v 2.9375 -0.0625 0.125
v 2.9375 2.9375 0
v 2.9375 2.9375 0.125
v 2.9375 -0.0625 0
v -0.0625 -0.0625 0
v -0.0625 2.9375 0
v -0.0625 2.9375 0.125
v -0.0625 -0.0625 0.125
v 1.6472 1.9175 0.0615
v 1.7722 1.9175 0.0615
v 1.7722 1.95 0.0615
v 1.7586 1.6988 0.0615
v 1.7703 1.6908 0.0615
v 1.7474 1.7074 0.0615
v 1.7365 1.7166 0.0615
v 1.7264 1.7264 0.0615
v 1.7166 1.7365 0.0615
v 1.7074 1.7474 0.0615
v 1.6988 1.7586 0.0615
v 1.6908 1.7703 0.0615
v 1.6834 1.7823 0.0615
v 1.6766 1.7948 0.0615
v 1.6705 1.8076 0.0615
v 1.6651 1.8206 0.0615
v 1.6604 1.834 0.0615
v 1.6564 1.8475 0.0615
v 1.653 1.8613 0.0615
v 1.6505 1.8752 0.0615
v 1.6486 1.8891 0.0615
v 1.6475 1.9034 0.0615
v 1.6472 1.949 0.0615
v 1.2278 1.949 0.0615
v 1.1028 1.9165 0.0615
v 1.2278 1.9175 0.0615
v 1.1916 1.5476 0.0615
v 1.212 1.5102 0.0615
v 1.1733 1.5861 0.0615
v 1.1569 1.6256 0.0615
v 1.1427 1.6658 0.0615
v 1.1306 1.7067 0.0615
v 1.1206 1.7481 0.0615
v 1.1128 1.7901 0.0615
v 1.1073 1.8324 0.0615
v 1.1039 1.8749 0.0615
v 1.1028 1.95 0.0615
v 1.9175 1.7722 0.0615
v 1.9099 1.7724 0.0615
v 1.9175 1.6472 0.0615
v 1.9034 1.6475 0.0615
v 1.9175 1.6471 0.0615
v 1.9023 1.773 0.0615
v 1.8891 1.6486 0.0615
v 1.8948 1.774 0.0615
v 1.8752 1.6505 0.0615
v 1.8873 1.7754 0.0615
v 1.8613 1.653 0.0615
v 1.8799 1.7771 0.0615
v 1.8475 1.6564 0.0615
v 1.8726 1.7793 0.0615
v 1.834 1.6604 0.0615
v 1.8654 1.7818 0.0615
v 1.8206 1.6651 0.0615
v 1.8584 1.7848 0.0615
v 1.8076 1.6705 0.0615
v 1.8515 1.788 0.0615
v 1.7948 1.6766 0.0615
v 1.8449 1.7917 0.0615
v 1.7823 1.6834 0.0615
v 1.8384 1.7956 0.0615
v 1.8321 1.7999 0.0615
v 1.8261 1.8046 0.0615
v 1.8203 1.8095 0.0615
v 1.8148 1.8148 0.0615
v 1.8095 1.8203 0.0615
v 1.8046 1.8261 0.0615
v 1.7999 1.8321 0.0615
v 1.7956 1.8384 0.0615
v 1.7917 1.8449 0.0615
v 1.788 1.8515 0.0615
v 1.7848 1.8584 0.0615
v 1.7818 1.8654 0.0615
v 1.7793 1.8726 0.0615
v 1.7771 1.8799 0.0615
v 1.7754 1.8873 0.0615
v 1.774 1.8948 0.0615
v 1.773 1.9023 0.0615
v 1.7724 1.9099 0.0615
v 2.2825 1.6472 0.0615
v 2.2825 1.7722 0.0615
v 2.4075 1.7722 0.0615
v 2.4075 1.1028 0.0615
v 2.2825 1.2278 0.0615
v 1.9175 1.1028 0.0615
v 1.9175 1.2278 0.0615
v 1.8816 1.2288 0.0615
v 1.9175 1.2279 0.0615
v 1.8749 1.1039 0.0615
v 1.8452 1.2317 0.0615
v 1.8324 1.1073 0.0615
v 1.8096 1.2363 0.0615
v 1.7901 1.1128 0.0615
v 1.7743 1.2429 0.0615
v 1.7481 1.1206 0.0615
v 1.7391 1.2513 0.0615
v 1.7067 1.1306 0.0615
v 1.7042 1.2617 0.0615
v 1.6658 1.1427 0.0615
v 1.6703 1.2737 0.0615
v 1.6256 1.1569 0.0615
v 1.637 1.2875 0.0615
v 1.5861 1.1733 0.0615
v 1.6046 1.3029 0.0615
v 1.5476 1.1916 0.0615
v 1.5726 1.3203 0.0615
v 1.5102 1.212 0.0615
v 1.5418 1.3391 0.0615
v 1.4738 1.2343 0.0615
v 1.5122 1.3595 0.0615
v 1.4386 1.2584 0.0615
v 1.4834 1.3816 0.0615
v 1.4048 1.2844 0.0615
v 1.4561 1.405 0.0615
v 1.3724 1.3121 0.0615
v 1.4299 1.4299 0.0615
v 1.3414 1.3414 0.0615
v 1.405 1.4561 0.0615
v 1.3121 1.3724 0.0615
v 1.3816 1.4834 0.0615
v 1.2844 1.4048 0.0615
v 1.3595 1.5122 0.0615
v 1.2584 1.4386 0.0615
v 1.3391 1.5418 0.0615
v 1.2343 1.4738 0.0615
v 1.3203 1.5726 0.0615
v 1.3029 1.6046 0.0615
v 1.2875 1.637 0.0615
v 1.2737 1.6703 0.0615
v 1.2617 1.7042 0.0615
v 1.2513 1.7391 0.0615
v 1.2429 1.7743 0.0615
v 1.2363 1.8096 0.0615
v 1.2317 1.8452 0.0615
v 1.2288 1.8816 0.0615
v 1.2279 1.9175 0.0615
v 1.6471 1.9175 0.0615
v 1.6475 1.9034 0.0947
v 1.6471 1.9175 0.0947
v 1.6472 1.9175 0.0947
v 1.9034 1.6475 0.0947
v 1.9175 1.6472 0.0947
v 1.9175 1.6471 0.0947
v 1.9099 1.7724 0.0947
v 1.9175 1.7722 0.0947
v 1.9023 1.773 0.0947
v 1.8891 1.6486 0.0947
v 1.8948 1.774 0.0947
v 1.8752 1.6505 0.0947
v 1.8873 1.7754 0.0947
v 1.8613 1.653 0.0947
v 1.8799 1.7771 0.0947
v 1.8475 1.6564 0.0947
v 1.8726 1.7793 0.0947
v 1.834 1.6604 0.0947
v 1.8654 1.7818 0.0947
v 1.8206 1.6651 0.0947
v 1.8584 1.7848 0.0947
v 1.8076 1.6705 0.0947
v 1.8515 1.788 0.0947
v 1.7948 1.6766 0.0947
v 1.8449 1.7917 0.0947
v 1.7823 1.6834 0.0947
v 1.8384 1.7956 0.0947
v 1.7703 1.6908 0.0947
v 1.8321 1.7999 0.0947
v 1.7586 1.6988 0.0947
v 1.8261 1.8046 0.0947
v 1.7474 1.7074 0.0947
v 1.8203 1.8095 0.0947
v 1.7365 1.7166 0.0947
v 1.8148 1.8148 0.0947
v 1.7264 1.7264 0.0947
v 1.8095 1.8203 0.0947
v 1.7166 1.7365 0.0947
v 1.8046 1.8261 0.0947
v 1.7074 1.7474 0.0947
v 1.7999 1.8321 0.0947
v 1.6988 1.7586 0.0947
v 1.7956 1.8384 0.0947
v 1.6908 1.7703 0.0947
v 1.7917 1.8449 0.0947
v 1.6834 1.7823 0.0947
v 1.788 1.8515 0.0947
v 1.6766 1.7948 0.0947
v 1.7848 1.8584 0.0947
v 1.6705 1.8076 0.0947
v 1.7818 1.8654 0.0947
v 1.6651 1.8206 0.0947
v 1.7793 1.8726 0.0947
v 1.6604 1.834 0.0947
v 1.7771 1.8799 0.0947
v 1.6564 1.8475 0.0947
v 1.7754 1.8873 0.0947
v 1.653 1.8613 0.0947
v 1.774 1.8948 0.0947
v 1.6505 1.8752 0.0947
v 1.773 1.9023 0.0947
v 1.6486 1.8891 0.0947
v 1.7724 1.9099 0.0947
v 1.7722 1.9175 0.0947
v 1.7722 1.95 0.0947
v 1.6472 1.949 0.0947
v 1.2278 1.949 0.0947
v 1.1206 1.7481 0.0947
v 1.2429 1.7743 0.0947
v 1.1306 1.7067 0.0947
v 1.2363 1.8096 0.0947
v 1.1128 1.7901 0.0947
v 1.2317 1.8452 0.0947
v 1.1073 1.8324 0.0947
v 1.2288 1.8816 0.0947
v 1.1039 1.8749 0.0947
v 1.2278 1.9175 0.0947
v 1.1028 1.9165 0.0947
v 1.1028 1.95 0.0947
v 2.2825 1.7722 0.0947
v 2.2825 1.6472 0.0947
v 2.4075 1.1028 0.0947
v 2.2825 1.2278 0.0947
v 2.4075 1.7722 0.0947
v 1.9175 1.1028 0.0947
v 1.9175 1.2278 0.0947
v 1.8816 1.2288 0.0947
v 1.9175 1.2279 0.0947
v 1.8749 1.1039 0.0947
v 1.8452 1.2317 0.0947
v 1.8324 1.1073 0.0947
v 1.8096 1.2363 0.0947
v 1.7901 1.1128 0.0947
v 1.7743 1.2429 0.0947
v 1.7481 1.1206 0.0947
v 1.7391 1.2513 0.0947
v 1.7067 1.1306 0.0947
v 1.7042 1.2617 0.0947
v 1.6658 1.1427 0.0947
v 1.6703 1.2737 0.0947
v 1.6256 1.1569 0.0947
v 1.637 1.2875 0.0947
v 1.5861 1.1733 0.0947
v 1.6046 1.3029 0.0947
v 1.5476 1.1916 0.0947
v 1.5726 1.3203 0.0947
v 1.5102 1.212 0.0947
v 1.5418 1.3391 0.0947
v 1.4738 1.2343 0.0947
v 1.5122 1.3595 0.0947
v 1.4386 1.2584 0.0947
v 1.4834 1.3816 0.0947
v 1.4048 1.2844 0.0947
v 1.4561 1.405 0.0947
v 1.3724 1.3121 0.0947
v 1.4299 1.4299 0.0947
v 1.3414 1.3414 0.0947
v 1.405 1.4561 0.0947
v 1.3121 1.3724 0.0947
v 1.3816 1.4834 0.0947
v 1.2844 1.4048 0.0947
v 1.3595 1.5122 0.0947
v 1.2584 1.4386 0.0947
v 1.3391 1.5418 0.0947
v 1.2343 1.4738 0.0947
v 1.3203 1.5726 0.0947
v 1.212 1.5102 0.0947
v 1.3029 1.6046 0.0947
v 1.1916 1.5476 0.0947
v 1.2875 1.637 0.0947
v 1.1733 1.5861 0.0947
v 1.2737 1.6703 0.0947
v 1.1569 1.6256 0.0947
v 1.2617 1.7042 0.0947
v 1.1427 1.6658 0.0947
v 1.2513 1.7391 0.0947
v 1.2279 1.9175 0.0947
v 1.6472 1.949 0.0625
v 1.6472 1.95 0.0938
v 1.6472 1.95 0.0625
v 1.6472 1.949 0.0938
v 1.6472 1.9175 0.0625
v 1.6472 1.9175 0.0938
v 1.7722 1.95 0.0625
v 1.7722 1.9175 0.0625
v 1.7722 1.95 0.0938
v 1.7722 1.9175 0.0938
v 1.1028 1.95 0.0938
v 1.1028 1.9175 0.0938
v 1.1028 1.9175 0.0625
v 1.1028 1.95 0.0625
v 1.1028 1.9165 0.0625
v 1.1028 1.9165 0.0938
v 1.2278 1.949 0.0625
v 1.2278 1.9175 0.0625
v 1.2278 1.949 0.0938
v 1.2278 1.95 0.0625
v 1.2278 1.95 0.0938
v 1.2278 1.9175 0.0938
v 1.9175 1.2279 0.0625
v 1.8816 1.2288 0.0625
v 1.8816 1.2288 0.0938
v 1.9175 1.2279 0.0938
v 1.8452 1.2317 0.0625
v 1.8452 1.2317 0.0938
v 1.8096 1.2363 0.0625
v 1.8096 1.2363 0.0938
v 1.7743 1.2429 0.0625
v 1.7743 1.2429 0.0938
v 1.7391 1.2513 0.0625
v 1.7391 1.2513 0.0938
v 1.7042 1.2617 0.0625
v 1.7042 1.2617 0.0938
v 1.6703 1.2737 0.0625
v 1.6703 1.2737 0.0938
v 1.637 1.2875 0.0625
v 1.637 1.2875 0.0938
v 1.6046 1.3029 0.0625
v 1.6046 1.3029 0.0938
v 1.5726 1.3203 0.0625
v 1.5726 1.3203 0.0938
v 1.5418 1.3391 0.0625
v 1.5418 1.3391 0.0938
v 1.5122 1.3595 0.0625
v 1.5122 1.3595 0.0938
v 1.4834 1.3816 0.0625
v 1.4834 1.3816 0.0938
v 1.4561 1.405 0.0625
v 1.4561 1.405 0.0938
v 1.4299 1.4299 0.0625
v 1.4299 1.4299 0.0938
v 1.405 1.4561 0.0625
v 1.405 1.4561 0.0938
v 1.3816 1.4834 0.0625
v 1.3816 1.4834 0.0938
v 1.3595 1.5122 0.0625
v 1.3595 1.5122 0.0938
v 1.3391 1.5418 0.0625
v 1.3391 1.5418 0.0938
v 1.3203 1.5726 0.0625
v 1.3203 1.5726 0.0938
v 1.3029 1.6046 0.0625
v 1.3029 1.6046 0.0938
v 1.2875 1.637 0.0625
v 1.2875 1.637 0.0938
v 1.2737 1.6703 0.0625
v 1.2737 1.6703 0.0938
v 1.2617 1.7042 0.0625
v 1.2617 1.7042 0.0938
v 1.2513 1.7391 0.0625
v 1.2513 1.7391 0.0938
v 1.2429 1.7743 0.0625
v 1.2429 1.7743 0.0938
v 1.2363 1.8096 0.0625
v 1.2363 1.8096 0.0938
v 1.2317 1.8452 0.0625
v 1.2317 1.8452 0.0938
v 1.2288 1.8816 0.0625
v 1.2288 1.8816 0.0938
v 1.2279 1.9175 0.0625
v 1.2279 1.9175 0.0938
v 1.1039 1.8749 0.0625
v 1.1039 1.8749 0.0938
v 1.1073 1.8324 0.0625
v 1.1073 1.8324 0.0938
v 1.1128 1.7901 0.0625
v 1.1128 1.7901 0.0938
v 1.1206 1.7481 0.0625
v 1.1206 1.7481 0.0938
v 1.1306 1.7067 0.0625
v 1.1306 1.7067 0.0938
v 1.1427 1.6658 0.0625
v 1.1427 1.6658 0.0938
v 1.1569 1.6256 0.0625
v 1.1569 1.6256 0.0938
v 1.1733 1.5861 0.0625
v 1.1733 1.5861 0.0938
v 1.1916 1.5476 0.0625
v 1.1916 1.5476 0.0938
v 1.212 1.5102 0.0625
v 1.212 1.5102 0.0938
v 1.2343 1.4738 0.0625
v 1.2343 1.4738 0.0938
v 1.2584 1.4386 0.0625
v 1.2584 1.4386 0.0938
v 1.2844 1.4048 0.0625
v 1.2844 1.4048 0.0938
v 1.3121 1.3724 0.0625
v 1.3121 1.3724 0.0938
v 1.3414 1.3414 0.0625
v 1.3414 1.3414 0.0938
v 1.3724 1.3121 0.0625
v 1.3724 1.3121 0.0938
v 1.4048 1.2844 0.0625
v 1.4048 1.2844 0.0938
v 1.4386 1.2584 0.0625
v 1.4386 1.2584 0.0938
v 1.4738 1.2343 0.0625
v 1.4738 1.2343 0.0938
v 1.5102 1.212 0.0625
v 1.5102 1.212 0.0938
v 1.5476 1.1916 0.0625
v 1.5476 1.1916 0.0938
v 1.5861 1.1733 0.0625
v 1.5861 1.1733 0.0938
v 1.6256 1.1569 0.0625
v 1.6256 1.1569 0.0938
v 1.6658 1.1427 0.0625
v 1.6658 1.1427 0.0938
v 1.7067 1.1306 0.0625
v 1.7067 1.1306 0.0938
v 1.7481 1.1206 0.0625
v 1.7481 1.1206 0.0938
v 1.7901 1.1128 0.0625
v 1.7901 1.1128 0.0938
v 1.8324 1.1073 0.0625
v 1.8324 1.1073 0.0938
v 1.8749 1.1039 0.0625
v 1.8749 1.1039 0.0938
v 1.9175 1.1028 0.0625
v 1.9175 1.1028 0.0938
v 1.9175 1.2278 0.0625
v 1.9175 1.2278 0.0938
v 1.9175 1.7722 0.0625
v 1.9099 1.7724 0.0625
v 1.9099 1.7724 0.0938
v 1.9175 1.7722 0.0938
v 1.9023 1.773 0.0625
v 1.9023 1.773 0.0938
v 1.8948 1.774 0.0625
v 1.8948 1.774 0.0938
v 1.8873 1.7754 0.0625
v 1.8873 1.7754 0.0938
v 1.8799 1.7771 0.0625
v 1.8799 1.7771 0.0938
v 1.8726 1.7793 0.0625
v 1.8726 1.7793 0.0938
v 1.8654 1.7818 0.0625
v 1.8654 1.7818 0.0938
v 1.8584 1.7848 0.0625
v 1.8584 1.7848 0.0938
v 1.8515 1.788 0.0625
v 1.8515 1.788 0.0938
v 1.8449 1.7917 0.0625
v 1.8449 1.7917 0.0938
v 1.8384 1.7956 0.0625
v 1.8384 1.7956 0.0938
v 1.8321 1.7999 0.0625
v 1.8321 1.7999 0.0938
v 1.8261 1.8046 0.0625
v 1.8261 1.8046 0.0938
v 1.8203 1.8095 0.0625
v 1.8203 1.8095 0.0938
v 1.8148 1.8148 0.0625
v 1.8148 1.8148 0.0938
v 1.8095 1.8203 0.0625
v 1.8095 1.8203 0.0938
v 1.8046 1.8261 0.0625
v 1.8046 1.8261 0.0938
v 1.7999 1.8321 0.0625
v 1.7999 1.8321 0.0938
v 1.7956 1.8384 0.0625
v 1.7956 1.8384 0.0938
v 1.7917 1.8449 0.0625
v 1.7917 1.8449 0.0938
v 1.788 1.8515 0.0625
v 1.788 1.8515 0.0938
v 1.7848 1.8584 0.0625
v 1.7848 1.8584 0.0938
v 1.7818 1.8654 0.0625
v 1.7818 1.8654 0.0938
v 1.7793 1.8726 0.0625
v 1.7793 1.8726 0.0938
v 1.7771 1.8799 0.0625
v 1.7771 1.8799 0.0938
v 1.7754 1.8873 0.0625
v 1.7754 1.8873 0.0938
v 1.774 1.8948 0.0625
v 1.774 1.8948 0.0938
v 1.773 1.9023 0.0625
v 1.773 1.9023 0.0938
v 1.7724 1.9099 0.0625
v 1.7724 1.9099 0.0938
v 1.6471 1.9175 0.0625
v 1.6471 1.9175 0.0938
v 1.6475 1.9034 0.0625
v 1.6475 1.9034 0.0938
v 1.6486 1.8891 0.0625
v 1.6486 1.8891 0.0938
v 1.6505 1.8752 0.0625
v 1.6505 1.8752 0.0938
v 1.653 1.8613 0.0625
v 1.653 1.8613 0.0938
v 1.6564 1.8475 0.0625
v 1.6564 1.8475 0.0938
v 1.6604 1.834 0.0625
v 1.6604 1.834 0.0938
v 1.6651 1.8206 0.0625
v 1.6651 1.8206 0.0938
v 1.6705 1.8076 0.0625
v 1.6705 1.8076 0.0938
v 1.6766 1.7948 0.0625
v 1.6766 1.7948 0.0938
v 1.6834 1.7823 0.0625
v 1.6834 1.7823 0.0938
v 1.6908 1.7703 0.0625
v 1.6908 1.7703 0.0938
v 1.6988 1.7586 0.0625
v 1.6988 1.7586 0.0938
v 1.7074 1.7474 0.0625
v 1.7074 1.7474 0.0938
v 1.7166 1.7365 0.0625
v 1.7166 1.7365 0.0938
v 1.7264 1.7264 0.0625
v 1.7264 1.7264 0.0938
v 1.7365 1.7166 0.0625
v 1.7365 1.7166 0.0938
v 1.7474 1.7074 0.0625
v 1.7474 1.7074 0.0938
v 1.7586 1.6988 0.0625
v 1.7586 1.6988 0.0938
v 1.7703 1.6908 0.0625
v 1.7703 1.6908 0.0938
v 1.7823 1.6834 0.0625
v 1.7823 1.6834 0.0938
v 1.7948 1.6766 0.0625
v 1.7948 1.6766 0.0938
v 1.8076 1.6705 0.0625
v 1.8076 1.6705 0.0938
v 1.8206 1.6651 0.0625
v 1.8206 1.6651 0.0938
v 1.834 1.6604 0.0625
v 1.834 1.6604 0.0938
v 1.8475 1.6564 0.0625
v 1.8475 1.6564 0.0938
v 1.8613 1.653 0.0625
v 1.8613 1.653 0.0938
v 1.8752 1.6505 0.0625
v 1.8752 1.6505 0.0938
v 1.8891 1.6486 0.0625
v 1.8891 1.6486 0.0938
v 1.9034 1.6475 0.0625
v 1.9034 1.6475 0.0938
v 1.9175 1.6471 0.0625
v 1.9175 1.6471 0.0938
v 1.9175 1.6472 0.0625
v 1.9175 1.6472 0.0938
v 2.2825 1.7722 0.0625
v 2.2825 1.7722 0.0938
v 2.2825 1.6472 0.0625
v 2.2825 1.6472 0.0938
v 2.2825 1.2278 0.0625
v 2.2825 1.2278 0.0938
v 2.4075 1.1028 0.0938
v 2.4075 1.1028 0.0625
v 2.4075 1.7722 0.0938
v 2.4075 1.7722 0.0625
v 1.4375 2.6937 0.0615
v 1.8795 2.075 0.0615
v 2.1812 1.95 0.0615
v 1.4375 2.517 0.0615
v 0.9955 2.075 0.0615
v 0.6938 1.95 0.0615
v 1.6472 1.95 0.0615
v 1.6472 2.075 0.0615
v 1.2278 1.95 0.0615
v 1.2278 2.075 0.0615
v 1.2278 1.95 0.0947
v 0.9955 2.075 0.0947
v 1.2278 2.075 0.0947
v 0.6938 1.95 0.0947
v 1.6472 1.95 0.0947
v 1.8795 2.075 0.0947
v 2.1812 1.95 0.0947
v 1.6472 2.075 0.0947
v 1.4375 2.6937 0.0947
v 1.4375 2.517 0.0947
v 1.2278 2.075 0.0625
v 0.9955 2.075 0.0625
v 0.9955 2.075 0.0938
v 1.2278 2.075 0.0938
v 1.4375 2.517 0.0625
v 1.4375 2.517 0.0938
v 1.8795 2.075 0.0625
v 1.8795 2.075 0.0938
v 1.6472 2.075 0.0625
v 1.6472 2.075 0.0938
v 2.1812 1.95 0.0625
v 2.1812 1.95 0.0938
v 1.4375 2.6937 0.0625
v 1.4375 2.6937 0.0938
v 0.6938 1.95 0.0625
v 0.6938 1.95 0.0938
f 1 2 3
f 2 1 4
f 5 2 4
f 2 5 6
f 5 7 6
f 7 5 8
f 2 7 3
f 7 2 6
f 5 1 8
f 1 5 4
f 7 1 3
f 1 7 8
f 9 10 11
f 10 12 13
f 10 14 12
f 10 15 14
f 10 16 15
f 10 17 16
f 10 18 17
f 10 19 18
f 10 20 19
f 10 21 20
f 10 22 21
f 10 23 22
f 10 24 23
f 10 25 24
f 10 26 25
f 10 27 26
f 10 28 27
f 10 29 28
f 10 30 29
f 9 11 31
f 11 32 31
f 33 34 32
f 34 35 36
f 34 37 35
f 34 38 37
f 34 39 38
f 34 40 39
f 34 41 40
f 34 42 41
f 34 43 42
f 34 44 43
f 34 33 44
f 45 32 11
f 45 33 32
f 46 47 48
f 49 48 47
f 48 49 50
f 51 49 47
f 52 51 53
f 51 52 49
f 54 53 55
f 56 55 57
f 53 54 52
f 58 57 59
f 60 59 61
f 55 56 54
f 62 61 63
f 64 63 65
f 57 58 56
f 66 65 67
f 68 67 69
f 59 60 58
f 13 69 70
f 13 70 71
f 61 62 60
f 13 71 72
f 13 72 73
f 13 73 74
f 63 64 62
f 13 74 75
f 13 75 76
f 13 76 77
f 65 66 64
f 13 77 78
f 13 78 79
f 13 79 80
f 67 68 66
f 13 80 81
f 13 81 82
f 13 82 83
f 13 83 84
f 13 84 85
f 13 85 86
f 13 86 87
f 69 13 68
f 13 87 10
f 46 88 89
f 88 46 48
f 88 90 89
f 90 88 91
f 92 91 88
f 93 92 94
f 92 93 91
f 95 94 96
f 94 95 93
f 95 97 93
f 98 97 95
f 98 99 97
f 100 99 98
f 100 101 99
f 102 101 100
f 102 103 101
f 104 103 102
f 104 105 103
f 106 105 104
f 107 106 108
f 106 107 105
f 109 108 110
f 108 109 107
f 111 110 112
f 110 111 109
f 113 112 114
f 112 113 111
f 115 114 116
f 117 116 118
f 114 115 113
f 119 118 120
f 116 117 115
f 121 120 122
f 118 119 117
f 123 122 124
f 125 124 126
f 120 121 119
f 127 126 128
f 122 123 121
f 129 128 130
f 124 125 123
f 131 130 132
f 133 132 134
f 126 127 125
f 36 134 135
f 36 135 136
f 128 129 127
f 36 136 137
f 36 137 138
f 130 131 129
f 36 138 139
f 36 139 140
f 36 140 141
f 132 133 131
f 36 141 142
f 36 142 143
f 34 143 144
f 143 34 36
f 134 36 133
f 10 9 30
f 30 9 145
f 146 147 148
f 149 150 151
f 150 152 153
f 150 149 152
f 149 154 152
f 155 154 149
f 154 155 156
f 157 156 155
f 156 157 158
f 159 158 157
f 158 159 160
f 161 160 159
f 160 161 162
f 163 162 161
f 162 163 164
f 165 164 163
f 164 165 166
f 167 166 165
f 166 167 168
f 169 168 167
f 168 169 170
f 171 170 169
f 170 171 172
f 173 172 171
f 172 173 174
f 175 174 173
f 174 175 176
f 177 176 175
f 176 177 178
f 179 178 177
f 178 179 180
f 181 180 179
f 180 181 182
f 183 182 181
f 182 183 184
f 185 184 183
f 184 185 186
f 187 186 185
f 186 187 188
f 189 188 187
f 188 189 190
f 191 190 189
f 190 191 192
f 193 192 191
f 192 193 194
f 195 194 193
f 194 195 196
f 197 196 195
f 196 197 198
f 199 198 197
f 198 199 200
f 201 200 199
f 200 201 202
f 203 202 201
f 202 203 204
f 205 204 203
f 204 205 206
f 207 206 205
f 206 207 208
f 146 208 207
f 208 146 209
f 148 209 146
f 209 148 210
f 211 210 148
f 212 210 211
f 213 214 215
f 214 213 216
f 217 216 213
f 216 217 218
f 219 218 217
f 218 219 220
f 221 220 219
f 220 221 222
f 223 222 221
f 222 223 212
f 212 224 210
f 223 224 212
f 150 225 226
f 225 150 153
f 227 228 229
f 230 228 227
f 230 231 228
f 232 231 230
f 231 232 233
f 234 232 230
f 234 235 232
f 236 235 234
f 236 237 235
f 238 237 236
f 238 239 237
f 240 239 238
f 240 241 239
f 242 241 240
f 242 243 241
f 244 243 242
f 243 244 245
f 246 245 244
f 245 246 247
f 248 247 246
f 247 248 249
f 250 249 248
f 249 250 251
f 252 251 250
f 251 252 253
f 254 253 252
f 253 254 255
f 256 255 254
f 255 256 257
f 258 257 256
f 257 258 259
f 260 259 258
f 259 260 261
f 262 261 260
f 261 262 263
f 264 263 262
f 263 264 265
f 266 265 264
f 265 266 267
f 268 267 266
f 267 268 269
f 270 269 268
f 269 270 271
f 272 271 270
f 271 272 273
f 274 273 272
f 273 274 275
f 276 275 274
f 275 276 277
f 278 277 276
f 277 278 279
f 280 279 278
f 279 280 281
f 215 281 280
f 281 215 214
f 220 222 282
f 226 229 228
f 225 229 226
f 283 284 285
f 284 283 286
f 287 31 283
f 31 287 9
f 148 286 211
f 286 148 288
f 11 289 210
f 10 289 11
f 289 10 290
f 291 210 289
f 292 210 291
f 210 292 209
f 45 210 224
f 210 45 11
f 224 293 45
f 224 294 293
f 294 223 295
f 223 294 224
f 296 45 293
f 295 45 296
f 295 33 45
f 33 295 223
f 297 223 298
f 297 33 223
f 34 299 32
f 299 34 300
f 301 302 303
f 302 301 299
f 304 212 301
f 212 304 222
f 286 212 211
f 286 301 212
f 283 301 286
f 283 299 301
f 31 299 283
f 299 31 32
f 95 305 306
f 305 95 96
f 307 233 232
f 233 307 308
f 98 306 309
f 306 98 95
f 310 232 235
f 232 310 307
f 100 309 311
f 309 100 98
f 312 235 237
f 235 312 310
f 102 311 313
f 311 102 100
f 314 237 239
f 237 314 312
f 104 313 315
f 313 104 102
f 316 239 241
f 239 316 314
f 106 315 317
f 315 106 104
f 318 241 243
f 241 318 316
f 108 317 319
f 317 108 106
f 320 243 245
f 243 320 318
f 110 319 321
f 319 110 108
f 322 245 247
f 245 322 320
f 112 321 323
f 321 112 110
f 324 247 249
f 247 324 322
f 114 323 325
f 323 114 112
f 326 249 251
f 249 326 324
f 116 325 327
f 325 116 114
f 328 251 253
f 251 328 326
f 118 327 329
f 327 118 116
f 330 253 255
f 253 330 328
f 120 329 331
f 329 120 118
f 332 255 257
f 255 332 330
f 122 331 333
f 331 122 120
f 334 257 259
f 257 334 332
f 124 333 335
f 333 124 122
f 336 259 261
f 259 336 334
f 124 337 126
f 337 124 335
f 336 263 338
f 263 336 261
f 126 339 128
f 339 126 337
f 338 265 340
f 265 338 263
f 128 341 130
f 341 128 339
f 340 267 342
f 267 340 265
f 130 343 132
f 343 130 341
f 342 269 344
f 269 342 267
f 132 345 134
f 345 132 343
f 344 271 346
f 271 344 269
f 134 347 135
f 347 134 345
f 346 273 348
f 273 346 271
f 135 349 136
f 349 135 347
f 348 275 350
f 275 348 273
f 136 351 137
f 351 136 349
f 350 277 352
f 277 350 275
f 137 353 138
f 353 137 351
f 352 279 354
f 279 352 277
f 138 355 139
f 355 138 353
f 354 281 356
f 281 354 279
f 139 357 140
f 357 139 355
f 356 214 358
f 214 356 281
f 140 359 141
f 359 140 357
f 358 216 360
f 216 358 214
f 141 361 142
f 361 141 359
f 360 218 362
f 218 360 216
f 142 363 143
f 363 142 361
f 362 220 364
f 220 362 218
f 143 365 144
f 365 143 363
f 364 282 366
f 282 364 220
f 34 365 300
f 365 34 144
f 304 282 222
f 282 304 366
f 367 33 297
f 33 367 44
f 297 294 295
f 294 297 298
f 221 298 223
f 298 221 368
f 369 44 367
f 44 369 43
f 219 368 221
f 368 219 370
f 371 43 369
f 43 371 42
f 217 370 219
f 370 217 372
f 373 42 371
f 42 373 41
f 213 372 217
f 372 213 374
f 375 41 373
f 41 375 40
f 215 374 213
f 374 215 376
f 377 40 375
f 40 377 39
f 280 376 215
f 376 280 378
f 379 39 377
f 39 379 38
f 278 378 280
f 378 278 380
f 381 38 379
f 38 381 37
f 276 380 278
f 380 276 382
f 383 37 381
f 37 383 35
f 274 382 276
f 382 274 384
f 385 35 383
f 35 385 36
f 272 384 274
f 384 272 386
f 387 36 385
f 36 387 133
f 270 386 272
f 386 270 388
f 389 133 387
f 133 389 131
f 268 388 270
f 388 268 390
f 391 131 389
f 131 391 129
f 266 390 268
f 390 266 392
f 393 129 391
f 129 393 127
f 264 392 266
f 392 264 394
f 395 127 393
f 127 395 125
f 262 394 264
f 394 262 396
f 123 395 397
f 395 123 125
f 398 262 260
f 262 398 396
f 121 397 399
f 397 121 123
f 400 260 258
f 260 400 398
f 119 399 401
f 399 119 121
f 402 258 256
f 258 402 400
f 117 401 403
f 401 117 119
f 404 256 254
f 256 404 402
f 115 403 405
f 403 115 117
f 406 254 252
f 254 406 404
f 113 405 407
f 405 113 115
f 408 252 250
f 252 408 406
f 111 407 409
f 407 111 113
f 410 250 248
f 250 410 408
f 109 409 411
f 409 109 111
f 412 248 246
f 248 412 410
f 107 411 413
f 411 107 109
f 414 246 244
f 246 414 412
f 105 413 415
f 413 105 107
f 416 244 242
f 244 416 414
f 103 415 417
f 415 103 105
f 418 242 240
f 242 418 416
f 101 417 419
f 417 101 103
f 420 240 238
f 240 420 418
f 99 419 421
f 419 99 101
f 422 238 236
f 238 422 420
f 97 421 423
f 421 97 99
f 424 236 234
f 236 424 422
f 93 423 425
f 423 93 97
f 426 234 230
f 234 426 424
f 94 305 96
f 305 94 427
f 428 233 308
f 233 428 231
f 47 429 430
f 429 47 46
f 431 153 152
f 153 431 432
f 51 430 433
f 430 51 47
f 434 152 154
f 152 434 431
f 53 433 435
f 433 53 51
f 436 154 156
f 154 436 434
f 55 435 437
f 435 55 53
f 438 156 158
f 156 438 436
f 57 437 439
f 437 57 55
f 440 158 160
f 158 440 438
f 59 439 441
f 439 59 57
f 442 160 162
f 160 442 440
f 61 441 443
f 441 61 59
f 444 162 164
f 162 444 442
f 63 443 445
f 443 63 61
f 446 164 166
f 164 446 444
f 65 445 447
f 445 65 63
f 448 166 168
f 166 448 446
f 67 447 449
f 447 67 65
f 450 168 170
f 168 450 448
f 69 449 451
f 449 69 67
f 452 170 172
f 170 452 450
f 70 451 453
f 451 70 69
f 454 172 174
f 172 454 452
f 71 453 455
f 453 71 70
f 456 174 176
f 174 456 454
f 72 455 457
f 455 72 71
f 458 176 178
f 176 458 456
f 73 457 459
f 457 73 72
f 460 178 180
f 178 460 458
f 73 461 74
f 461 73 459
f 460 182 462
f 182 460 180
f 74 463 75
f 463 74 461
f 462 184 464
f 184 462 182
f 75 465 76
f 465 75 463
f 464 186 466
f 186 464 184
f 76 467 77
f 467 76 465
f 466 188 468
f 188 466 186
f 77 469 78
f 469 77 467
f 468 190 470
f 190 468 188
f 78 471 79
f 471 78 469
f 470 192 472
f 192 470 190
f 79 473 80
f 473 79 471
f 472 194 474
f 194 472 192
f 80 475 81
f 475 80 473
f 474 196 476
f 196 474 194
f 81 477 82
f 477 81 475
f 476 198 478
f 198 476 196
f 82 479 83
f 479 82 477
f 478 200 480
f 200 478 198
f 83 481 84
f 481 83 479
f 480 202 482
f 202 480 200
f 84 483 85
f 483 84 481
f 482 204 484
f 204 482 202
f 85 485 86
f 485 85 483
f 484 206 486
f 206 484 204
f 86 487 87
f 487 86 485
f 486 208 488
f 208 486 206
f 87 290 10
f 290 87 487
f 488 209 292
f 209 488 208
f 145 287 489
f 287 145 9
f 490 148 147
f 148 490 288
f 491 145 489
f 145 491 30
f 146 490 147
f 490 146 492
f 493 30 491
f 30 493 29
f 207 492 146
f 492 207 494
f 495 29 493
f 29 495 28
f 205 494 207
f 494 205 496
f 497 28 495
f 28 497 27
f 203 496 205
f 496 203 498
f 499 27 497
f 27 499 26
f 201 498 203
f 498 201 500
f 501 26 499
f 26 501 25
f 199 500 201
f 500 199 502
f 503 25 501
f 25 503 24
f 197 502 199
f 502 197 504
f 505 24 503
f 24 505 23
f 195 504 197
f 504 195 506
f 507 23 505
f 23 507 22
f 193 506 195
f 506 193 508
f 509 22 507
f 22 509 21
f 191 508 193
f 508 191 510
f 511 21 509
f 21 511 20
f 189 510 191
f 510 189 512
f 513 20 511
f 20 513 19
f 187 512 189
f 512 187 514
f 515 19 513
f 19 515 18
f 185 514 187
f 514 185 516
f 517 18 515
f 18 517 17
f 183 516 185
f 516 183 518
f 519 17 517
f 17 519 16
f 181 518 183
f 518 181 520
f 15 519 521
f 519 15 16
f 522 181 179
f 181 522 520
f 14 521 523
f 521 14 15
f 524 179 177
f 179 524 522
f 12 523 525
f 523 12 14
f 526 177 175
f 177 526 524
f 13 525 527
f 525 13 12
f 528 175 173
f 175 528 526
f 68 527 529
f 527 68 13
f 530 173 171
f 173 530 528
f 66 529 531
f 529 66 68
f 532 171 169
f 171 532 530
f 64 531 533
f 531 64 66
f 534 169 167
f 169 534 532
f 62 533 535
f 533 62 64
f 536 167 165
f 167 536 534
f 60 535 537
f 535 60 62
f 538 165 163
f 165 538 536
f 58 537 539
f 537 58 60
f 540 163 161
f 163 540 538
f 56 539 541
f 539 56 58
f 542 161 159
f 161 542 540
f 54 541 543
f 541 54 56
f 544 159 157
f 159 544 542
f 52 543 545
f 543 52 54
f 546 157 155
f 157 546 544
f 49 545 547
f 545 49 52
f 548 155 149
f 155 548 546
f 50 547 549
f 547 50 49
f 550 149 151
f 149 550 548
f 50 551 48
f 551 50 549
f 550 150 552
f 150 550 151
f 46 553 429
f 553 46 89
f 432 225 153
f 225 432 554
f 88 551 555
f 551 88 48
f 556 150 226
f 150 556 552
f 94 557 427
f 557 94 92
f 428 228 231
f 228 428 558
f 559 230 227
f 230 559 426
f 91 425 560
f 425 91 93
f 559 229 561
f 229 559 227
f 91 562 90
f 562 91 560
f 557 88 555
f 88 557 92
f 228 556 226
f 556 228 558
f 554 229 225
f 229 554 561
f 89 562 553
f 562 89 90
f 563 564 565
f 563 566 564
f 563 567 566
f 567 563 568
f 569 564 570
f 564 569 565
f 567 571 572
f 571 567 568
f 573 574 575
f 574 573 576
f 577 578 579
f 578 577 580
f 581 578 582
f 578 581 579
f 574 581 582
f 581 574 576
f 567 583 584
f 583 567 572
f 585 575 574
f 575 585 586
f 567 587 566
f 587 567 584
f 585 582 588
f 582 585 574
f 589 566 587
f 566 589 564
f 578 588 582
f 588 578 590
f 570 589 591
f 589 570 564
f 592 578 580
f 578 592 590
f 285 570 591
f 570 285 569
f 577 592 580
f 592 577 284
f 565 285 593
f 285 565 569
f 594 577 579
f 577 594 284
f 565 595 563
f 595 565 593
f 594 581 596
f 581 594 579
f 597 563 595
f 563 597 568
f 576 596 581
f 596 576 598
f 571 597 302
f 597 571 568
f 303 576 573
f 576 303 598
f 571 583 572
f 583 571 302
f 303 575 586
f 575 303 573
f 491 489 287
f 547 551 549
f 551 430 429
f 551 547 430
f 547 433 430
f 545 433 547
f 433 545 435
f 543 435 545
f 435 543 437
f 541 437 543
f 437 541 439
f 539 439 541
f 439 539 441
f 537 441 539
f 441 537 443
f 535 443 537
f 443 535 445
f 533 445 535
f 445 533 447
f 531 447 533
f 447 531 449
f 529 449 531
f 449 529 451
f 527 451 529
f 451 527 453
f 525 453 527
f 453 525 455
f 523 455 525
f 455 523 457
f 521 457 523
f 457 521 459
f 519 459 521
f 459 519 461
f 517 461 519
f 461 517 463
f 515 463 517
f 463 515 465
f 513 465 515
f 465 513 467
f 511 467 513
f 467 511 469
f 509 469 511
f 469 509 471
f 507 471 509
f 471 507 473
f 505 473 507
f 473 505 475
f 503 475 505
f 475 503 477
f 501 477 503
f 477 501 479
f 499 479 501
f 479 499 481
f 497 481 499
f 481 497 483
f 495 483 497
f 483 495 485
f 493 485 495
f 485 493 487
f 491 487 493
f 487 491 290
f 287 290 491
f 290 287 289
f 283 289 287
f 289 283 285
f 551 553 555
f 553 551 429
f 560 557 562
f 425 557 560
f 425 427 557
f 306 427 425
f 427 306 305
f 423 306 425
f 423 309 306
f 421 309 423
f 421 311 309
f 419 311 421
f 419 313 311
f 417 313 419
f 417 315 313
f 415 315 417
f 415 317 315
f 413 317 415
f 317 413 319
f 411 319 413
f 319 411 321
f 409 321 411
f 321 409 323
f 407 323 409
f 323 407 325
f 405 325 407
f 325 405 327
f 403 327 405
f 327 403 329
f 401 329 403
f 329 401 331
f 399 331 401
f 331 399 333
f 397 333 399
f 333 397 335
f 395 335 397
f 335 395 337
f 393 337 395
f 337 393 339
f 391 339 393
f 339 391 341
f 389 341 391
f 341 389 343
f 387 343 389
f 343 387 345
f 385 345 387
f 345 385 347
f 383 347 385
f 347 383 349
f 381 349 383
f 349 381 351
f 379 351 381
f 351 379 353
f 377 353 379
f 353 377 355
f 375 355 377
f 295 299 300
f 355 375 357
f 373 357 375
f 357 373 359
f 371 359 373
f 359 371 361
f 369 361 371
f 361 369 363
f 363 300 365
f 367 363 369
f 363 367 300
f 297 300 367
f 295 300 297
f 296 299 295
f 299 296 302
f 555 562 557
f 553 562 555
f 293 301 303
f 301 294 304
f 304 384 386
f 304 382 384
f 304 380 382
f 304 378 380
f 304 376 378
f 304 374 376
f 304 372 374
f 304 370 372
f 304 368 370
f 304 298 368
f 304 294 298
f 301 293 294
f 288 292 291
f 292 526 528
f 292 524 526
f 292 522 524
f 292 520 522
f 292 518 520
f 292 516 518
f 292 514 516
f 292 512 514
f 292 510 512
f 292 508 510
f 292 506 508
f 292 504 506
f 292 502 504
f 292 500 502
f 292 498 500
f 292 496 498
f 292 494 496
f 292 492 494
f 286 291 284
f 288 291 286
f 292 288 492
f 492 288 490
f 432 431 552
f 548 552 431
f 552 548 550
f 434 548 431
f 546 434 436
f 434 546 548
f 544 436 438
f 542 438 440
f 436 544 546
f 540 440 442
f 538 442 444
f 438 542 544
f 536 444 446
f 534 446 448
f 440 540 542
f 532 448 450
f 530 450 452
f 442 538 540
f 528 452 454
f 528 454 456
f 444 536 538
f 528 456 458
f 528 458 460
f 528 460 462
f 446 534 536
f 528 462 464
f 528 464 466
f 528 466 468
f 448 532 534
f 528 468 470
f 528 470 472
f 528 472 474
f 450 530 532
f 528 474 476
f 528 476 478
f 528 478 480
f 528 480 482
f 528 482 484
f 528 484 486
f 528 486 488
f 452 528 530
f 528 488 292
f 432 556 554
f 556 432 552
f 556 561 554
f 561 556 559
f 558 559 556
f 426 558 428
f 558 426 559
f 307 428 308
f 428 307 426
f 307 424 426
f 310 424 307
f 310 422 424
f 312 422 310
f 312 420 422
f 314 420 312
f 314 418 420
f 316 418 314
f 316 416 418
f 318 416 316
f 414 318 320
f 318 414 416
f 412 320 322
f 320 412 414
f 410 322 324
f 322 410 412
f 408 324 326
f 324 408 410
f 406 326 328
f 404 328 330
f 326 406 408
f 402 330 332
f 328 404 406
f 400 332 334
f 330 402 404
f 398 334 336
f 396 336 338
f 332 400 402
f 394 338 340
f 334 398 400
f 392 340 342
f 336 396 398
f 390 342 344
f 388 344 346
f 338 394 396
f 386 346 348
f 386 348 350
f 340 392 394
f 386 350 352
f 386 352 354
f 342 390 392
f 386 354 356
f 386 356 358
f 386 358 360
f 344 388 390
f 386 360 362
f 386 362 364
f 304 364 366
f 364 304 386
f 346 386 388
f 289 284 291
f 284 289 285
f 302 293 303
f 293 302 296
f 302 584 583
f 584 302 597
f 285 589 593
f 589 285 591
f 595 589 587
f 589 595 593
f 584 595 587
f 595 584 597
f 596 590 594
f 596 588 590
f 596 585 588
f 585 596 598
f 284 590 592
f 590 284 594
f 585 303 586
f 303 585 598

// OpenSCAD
// file: sub_water_base_plate.scad
// sub_water_base_plate.scad — base plate for the "water" tile family
// (element55 straight, future right-turn/left-turn variants)
// Units: inches
//
// Unlike sub_base_plate.scad's single darkgray plate, this family stacks the
// top pattern_h-plus a bit into three visible layers, bottom to top:
//   darkgray          — 1/2 plate_h  (structural base)
//   background_color  — 1/4 plate_h  (caller-defined)
//   transparent_color — 1/4 plate_h  (caller-defined, spans the outer
//                                      footprint — frame included — so it
//                                      caps the border too)
// Rivets run through darkgray + background_color only (3/4 plate_h) — the
// transparent_color cap sits over them uncut. frame_with_id() is built to
// that same 3/4 plate_h, so its top 1/4 is covered by the transparent cap
// exactly like the inner plate. The arrow (sub_water_arrows.scad) is
// unaffected — it still lives in its own top pattern_h slice, which happens
// to be the same pattern_h as the transparent_color layer at current
// dimensions, but is not derived from it.

plate_w = 2 + 7/8;
plate_d = 2 + 7/8;
plate_h = 1/8; // full plate thickness
frame_w = 1/16;
hole_d  = 3/32;
hole_r  = hole_d / 2;

pattern_h = 1/32;  // thickness of the arrow's top slice (sub_water_arrows.scad) —
                   // independent of the layer fractions below even though it
                   // currently equals plate_h/4.
id_cover = plate_h * 3 / 16;

// ── Layer heights ───────────────────────────────────────────────────────
darkgray_h    = plate_h / 2;
background_h  = plate_h / 4;
transparent_h = plate_h / 4;
frame_h       = plate_h * 3 / 4;               // = darkgray_h + background_h
rivet_depth   = darkgray_h + background_h;     // rivets stop where the transparent cap starts

module rivet_holes() {
    spacing_x = plate_w / 10;
    spacing_y = plate_d / 10;
    inset_x   = spacing_x / 2;
    inset_y   = spacing_y / 2;
    for (i = [0:9]) translate([inset_x + i * spacing_x, inset_y,           -1]) cylinder(h = rivet_depth + 2, r = hole_r, $fn = 20);
    for (i = [0:9]) translate([inset_x + i * spacing_x, plate_d - inset_y, -1]) cylinder(h = rivet_depth + 2, r = hole_r, $fn = 20);
    for (i = [0:9]) translate([inset_x,           inset_y + i * spacing_y, -1]) cylinder(h = rivet_depth + 2, r = hole_r, $fn = 20);
    for (i = [0:9]) translate([plate_w - inset_x, inset_y + i * spacing_y, -1]) cylinder(h = rivet_depth + 2, r = hole_r, $fn = 20);
}

module rivets() {
    spacing_x = plate_w / 10;
    spacing_y = plate_d / 10;
    inset_x   = spacing_x / 2;
    inset_y   = spacing_y / 2;
    color("lightgray") {
        for (i = [0:9]) translate([inset_x + i * spacing_x, inset_y,           0]) cylinder(h = rivet_depth, r = hole_r, $fn = 20);
        for (i = [0:9]) translate([inset_x + i * spacing_x, plate_d - inset_y, 0]) cylinder(h = rivet_depth, r = hole_r, $fn = 20);
        for (i = [0:9]) translate([inset_x,           inset_y + i * spacing_y, 0]) cylinder(h = rivet_depth, r = hole_r, $fn = 20);
        for (i = [0:9]) translate([plate_w - inset_x, inset_y + i * spacing_y, 0]) cylinder(h = rivet_depth, r = hole_r, $fn = 20);
    }
}

// Border + edge ID marks, built to frame_h (3/4 plate_h) — the transparent
// cap covers the remaining top 1/4, over the frame as well as the plate.
module frame_with_id(colors = []) {
    region_w = plate_w / 8;
    region_d = plate_d / 8;
    mark_h   = frame_h - 2 * id_cover;

    color("black")
    difference() {
        translate([-frame_w, -frame_w, 0])
            cube([plate_w + 2 * frame_w, plate_d + 2 * frame_w, frame_h]);
        translate([0, 0, -0.001])
            cube([plate_w, plate_d, frame_h + 0.002]);
        // top/bottom/left/right straight runs only — corners stay solid black
        translate([0, plate_d - 0.001, -0.001])
            cube([plate_w, frame_w + 0.002, frame_h + 0.002]);
        translate([0, -frame_w - 0.001, -0.001])
            cube([plate_w, frame_w + 0.002, frame_h + 0.002]);
        translate([-frame_w - 0.001, 0, -0.001])
            cube([frame_w + 0.002, plate_d, frame_h + 0.002]);
        translate([plate_w - 0.001, 0, -0.001])
            cube([frame_w + 0.002, plate_d, frame_h + 0.002]);
    }

    for (i = [0:7]) {
        c     = (i == 0) ? "darkgray" : (i == 7) ? "black" : ((colors[i-1] != undef) ? colors[i-1] : "black");

        // top edge — id_cover, mark, id_cover
        color("black") translate([i * region_w, plate_d, 0]) cube([region_w, frame_w, id_cover]);
        color(c)       translate([i * region_w, plate_d, id_cover]) cube([region_w, frame_w, mark_h]);
        color("black") translate([i * region_w, plate_d, id_cover + mark_h]) cube([region_w, frame_w, id_cover]);

        // bottom edge (reversed) — id_cover, mark, id_cover
        color("black") translate([(7-i) * region_w, -frame_w, 0]) cube([region_w, frame_w, id_cover]);
        color(c)       translate([(7-i) * region_w, -frame_w, id_cover]) cube([region_w, frame_w, mark_h]);
        color("black") translate([(7-i) * region_w, -frame_w, id_cover + mark_h]) cube([region_w, frame_w, id_cover]);

        // left edge — id_cover, mark, id_cover
        color("black") translate([-frame_w, i * region_d, 0]) cube([frame_w, region_d, id_cover]);
        color(c)       translate([-frame_w, i * region_d, id_cover]) cube([frame_w, region_d, mark_h]);
        color("black") translate([-frame_w, i * region_d, id_cover + mark_h]) cube([frame_w, region_d, id_cover]);

        // right edge (reversed) — id_cover, mark, id_cover
        color("black") translate([plate_w, (7-i) * region_d, 0]) cube([frame_w, region_d, id_cover]);
        color(c)       translate([plate_w, (7-i) * region_d, id_cover]) cube([frame_w, region_d, mark_h]);
        color("black") translate([plate_w, (7-i) * region_d, id_cover + mark_h]) cube([frame_w, region_d, id_cover]);
    }
}

// Frame + inner darkgray/background_color stack, with rivets running
// through both. Does not include the transparent cap — see
// plate_trans_layer().
module plate(colors = []) {
    frame_with_id(colors);
    union() {
        difference() {
            union() {
                color("darkgray")
                    cube([plate_w, plate_d, darkgray_h]);
                translate([0, 0, darkgray_h])
                color(background_color)
                    cube([plate_w, plate_d, background_h]);
            }
            rivet_holes();
        }
        rivets();
    }
}

// plate() plus the transparent_color cap — spans the full outer footprint
// (frame included) across the top transparent_h slice. plate()'s frame and
// inner stack both already stop exactly at plate_h - transparent_h, so this
// is a plain union, not a cut-and-refill.
module plate_trans_layer(colors = []) {
    plate(colors);
    if (show_transparent) {
        color(transparent_color)
        translate([-frame_w, -frame_w, plate_h - transparent_h])
            cube([plate_w + 2 * frame_w, plate_d + 2 * frame_w, transparent_h]);
    }
}   
// main file
// element55.scad — still water tile
// Units: inches

straight     = false;
left_turn    = false;
right_turn   = true;
double_speed = false;
show_transparent = true;  // if false, the transparent layer is omitted entirely — useful for
                          // debugging the underlying layers

include <sub_water_base_plate.scad>
include <sub_water_arrows.scad>

plate_colors = [undef, undef, undef, undef, "lightblue", "lightblue"];

arrow_color  = "black";
background_color = "blue";
transparent_color = "lightblue";

difference() {
    plate_trans_layer(plate_colors);
    arrow_cutout();
}
arrow();
